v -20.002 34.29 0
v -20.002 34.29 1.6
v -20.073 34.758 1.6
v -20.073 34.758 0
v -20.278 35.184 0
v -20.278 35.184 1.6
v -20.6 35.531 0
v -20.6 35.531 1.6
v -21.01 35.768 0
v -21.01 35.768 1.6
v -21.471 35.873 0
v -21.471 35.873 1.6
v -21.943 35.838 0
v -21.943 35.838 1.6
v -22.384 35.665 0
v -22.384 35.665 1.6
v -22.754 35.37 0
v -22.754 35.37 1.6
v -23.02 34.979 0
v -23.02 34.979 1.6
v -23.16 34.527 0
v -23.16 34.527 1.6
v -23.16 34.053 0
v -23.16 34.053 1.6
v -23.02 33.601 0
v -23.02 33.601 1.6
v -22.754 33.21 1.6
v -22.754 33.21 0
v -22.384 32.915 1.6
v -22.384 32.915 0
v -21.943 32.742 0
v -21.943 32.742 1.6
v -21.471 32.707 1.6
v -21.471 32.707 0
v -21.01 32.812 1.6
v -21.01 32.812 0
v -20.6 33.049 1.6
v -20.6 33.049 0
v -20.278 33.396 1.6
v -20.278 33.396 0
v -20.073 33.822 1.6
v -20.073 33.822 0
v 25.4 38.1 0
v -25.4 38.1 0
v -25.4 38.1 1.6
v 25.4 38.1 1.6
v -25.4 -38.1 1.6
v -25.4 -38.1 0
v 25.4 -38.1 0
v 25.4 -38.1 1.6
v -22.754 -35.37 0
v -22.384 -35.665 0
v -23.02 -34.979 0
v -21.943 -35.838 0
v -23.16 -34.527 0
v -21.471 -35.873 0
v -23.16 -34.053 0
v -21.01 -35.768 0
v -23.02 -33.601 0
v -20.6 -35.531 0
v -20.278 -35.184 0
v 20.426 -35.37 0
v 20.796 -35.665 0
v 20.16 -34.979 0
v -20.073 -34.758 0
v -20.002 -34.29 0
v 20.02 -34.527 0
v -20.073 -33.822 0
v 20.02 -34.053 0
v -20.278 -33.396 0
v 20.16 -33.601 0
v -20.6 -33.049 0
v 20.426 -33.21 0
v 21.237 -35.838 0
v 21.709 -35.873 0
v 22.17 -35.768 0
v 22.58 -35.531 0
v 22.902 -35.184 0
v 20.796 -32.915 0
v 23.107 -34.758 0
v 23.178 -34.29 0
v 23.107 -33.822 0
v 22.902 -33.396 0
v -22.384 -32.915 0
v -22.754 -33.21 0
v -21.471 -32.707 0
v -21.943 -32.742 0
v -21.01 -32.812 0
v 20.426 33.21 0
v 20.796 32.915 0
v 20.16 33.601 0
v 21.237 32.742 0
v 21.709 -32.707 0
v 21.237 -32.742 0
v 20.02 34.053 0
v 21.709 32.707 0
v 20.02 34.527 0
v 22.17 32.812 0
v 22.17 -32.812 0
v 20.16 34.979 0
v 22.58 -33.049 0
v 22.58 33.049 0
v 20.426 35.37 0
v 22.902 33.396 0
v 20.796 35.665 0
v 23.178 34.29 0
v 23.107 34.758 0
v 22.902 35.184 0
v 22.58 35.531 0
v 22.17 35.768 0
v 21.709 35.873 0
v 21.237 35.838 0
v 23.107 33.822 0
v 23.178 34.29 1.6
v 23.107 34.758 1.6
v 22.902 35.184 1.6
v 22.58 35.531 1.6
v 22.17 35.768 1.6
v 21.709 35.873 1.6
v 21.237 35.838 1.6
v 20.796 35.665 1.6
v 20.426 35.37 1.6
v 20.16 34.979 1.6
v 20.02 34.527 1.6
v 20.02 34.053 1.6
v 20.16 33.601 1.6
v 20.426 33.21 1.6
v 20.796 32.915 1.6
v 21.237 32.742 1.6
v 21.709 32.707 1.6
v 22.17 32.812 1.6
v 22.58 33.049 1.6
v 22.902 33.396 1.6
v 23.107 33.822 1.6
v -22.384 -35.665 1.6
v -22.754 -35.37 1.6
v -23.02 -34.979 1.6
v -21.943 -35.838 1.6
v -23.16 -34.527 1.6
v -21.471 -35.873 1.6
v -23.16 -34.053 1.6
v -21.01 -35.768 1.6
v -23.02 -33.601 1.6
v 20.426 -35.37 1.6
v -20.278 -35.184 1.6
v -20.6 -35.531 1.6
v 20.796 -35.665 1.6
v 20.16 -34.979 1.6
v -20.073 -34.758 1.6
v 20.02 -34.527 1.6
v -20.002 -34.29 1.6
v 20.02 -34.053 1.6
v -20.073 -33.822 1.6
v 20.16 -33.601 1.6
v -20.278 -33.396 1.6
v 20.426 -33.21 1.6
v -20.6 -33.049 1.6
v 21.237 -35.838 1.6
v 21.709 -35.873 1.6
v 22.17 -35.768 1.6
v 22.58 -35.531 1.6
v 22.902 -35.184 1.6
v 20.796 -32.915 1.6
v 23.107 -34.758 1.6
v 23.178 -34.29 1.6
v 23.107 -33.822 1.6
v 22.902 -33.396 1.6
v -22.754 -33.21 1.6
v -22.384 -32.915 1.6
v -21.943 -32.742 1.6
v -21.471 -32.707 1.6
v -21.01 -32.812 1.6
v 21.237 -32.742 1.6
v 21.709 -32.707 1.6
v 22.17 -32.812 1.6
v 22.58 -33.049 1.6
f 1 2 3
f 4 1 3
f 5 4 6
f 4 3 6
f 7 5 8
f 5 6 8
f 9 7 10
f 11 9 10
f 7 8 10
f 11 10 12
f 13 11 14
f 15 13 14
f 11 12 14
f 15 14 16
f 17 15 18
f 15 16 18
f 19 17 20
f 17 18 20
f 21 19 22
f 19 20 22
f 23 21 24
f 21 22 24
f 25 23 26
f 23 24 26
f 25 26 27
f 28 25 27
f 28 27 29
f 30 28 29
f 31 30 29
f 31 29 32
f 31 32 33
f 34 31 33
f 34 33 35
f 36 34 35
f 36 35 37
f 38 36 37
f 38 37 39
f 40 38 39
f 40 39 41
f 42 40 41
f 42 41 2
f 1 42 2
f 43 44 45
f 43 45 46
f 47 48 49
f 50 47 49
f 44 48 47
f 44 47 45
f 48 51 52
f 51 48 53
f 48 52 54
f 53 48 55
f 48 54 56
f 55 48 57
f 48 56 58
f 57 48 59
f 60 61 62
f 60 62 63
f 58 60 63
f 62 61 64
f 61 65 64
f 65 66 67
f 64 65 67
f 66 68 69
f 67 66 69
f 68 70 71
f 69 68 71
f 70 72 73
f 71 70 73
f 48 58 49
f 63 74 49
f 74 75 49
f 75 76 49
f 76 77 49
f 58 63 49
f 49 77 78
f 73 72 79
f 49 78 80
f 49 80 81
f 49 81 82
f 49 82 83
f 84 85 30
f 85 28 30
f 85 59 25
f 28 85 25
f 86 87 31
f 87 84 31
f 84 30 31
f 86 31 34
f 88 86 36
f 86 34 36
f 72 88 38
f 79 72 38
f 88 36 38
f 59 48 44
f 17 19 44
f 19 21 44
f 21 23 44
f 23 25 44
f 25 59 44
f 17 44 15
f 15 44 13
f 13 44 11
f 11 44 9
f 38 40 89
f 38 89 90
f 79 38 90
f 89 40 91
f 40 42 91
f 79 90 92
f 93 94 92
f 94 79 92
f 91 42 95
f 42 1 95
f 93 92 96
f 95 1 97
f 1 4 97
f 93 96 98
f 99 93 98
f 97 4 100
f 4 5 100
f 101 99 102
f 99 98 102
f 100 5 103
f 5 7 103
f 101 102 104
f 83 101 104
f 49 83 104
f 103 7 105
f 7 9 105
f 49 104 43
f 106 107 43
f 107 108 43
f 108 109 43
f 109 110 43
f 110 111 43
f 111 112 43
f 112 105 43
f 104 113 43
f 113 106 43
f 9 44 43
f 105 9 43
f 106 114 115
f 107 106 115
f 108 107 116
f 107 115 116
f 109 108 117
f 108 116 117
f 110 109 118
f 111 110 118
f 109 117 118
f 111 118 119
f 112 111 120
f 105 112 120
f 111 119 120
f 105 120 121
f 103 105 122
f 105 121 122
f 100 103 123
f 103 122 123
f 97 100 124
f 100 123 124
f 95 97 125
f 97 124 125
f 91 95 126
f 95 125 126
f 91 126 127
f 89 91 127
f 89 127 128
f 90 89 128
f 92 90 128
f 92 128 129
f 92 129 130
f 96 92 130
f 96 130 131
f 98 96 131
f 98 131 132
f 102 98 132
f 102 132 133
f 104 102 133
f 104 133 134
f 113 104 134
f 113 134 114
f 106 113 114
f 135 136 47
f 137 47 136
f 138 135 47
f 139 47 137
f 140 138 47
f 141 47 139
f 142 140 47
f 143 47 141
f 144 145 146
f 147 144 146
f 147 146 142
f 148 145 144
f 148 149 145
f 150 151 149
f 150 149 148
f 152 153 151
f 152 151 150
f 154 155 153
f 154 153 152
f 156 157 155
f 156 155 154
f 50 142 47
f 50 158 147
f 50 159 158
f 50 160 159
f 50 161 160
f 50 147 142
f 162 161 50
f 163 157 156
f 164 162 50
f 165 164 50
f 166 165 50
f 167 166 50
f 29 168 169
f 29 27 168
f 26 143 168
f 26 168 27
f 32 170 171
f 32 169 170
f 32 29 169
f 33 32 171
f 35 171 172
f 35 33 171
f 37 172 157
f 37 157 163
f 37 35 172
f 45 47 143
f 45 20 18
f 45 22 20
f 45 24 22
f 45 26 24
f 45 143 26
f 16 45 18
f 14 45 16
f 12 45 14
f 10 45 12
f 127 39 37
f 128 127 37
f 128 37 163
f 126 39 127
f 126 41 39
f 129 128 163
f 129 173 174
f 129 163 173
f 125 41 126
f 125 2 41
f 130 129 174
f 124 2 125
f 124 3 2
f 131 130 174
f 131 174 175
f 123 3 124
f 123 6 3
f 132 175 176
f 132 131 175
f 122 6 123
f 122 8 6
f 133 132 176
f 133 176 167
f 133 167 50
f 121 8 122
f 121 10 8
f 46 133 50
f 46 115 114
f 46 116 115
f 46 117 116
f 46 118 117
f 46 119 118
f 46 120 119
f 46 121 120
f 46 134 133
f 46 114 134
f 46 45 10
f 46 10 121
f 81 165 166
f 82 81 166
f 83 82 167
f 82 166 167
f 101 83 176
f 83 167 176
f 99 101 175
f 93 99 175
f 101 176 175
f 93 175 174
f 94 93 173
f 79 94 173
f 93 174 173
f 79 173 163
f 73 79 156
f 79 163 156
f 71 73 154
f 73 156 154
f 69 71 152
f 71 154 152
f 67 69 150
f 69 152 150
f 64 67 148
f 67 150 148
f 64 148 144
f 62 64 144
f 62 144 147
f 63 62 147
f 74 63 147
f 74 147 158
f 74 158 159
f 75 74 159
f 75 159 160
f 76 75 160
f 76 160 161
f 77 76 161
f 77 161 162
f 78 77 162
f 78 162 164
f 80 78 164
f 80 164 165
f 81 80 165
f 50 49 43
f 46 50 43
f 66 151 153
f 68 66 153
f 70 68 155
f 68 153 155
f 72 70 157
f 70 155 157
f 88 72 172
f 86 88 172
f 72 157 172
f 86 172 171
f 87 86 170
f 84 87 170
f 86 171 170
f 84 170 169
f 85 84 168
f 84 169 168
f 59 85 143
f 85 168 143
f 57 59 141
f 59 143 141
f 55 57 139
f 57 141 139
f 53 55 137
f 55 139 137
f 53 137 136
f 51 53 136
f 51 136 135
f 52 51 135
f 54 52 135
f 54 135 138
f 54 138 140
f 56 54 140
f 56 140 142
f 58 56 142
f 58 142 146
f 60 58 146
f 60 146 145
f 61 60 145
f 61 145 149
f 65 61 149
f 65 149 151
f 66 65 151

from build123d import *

# Parameters (mm, degrees)
SKETCH1_W           = 50.8
SKETCH1_H           = 76.2
BOSS_EXTRUDE1_DEPTH = 1.6002
CUT_EXTRUDE1_REACH  = 47.818
SKETCH2_R           = 1.5875


with BuildPart() as part:
    # Sketch1 → Boss-Extrude1 (new body)
    with BuildSketch(Plane.XY):
        Rectangle(SKETCH1_W, SKETCH1_H)
    extrude(amount=BOSS_EXTRUDE1_DEPTH)

    # Sketch2 → Cut-Extrude1 (cut, up to next)
    with BuildSketch(Plane.XY.offset(1.6002), mode=Mode.PRIVATE) as cut_extrude1_sk1:
        with Locations((-21.59, 34.29)):
            Circle(SKETCH2_R)
    cut_extrude1_tool1 = extrude(cut_extrude1_sk1.sketch, amount=-CUT_EXTRUDE1_REACH, mode=Mode.PRIVATE) & part.part
    # Sketch2 → Cut-Extrude1 (cut, up to next)
    with BuildSketch(Plane.XY.offset(1.6002), mode=Mode.PRIVATE) as cut_extrude1_sk2:
        with Locations((21.59, 34.29)):
            Circle(SKETCH2_R)
    cut_extrude1_tool2 = extrude(cut_extrude1_sk2.sketch, amount=-CUT_EXTRUDE1_REACH, mode=Mode.PRIVATE) & part.part
    # Sketch2 → Cut-Extrude1 (cut, up to next)
    with BuildSketch(Plane.XY.offset(1.6002), mode=Mode.PRIVATE) as cut_extrude1_sk3:
        with Locations((21.59, -34.29)):
            Circle(SKETCH2_R)
    cut_extrude1_tool3 = extrude(cut_extrude1_sk3.sketch, amount=-CUT_EXTRUDE1_REACH, mode=Mode.PRIVATE) & part.part
    # Sketch2 → Cut-Extrude1 (cut, up to next)
    with BuildSketch(Plane.XY.offset(1.6002), mode=Mode.PRIVATE) as cut_extrude1_sk4:
        with Locations((-21.59, -34.29)):
            Circle(SKETCH2_R)
    cut_extrude1_tool4 = extrude(cut_extrude1_sk4.sketch, amount=-CUT_EXTRUDE1_REACH, mode=Mode.PRIVATE) & part.part
    add(cut_extrude1_tool1.solids().sort_by_distance((-21.59, 34.29, 1.6002))[0], mode=Mode.SUBTRACT)
    add(cut_extrude1_tool2.solids().sort_by_distance((21.59, 34.29, 1.6002))[0], mode=Mode.SUBTRACT)
    add(cut_extrude1_tool3.solids().sort_by_distance((21.59, -34.29, 1.6002))[0], mode=Mode.SUBTRACT)
    add(cut_extrude1_tool4.solids().sort_by_distance((-21.59, -34.29, 1.6002))[0], mode=Mode.SUBTRACT)


solid = part.part
